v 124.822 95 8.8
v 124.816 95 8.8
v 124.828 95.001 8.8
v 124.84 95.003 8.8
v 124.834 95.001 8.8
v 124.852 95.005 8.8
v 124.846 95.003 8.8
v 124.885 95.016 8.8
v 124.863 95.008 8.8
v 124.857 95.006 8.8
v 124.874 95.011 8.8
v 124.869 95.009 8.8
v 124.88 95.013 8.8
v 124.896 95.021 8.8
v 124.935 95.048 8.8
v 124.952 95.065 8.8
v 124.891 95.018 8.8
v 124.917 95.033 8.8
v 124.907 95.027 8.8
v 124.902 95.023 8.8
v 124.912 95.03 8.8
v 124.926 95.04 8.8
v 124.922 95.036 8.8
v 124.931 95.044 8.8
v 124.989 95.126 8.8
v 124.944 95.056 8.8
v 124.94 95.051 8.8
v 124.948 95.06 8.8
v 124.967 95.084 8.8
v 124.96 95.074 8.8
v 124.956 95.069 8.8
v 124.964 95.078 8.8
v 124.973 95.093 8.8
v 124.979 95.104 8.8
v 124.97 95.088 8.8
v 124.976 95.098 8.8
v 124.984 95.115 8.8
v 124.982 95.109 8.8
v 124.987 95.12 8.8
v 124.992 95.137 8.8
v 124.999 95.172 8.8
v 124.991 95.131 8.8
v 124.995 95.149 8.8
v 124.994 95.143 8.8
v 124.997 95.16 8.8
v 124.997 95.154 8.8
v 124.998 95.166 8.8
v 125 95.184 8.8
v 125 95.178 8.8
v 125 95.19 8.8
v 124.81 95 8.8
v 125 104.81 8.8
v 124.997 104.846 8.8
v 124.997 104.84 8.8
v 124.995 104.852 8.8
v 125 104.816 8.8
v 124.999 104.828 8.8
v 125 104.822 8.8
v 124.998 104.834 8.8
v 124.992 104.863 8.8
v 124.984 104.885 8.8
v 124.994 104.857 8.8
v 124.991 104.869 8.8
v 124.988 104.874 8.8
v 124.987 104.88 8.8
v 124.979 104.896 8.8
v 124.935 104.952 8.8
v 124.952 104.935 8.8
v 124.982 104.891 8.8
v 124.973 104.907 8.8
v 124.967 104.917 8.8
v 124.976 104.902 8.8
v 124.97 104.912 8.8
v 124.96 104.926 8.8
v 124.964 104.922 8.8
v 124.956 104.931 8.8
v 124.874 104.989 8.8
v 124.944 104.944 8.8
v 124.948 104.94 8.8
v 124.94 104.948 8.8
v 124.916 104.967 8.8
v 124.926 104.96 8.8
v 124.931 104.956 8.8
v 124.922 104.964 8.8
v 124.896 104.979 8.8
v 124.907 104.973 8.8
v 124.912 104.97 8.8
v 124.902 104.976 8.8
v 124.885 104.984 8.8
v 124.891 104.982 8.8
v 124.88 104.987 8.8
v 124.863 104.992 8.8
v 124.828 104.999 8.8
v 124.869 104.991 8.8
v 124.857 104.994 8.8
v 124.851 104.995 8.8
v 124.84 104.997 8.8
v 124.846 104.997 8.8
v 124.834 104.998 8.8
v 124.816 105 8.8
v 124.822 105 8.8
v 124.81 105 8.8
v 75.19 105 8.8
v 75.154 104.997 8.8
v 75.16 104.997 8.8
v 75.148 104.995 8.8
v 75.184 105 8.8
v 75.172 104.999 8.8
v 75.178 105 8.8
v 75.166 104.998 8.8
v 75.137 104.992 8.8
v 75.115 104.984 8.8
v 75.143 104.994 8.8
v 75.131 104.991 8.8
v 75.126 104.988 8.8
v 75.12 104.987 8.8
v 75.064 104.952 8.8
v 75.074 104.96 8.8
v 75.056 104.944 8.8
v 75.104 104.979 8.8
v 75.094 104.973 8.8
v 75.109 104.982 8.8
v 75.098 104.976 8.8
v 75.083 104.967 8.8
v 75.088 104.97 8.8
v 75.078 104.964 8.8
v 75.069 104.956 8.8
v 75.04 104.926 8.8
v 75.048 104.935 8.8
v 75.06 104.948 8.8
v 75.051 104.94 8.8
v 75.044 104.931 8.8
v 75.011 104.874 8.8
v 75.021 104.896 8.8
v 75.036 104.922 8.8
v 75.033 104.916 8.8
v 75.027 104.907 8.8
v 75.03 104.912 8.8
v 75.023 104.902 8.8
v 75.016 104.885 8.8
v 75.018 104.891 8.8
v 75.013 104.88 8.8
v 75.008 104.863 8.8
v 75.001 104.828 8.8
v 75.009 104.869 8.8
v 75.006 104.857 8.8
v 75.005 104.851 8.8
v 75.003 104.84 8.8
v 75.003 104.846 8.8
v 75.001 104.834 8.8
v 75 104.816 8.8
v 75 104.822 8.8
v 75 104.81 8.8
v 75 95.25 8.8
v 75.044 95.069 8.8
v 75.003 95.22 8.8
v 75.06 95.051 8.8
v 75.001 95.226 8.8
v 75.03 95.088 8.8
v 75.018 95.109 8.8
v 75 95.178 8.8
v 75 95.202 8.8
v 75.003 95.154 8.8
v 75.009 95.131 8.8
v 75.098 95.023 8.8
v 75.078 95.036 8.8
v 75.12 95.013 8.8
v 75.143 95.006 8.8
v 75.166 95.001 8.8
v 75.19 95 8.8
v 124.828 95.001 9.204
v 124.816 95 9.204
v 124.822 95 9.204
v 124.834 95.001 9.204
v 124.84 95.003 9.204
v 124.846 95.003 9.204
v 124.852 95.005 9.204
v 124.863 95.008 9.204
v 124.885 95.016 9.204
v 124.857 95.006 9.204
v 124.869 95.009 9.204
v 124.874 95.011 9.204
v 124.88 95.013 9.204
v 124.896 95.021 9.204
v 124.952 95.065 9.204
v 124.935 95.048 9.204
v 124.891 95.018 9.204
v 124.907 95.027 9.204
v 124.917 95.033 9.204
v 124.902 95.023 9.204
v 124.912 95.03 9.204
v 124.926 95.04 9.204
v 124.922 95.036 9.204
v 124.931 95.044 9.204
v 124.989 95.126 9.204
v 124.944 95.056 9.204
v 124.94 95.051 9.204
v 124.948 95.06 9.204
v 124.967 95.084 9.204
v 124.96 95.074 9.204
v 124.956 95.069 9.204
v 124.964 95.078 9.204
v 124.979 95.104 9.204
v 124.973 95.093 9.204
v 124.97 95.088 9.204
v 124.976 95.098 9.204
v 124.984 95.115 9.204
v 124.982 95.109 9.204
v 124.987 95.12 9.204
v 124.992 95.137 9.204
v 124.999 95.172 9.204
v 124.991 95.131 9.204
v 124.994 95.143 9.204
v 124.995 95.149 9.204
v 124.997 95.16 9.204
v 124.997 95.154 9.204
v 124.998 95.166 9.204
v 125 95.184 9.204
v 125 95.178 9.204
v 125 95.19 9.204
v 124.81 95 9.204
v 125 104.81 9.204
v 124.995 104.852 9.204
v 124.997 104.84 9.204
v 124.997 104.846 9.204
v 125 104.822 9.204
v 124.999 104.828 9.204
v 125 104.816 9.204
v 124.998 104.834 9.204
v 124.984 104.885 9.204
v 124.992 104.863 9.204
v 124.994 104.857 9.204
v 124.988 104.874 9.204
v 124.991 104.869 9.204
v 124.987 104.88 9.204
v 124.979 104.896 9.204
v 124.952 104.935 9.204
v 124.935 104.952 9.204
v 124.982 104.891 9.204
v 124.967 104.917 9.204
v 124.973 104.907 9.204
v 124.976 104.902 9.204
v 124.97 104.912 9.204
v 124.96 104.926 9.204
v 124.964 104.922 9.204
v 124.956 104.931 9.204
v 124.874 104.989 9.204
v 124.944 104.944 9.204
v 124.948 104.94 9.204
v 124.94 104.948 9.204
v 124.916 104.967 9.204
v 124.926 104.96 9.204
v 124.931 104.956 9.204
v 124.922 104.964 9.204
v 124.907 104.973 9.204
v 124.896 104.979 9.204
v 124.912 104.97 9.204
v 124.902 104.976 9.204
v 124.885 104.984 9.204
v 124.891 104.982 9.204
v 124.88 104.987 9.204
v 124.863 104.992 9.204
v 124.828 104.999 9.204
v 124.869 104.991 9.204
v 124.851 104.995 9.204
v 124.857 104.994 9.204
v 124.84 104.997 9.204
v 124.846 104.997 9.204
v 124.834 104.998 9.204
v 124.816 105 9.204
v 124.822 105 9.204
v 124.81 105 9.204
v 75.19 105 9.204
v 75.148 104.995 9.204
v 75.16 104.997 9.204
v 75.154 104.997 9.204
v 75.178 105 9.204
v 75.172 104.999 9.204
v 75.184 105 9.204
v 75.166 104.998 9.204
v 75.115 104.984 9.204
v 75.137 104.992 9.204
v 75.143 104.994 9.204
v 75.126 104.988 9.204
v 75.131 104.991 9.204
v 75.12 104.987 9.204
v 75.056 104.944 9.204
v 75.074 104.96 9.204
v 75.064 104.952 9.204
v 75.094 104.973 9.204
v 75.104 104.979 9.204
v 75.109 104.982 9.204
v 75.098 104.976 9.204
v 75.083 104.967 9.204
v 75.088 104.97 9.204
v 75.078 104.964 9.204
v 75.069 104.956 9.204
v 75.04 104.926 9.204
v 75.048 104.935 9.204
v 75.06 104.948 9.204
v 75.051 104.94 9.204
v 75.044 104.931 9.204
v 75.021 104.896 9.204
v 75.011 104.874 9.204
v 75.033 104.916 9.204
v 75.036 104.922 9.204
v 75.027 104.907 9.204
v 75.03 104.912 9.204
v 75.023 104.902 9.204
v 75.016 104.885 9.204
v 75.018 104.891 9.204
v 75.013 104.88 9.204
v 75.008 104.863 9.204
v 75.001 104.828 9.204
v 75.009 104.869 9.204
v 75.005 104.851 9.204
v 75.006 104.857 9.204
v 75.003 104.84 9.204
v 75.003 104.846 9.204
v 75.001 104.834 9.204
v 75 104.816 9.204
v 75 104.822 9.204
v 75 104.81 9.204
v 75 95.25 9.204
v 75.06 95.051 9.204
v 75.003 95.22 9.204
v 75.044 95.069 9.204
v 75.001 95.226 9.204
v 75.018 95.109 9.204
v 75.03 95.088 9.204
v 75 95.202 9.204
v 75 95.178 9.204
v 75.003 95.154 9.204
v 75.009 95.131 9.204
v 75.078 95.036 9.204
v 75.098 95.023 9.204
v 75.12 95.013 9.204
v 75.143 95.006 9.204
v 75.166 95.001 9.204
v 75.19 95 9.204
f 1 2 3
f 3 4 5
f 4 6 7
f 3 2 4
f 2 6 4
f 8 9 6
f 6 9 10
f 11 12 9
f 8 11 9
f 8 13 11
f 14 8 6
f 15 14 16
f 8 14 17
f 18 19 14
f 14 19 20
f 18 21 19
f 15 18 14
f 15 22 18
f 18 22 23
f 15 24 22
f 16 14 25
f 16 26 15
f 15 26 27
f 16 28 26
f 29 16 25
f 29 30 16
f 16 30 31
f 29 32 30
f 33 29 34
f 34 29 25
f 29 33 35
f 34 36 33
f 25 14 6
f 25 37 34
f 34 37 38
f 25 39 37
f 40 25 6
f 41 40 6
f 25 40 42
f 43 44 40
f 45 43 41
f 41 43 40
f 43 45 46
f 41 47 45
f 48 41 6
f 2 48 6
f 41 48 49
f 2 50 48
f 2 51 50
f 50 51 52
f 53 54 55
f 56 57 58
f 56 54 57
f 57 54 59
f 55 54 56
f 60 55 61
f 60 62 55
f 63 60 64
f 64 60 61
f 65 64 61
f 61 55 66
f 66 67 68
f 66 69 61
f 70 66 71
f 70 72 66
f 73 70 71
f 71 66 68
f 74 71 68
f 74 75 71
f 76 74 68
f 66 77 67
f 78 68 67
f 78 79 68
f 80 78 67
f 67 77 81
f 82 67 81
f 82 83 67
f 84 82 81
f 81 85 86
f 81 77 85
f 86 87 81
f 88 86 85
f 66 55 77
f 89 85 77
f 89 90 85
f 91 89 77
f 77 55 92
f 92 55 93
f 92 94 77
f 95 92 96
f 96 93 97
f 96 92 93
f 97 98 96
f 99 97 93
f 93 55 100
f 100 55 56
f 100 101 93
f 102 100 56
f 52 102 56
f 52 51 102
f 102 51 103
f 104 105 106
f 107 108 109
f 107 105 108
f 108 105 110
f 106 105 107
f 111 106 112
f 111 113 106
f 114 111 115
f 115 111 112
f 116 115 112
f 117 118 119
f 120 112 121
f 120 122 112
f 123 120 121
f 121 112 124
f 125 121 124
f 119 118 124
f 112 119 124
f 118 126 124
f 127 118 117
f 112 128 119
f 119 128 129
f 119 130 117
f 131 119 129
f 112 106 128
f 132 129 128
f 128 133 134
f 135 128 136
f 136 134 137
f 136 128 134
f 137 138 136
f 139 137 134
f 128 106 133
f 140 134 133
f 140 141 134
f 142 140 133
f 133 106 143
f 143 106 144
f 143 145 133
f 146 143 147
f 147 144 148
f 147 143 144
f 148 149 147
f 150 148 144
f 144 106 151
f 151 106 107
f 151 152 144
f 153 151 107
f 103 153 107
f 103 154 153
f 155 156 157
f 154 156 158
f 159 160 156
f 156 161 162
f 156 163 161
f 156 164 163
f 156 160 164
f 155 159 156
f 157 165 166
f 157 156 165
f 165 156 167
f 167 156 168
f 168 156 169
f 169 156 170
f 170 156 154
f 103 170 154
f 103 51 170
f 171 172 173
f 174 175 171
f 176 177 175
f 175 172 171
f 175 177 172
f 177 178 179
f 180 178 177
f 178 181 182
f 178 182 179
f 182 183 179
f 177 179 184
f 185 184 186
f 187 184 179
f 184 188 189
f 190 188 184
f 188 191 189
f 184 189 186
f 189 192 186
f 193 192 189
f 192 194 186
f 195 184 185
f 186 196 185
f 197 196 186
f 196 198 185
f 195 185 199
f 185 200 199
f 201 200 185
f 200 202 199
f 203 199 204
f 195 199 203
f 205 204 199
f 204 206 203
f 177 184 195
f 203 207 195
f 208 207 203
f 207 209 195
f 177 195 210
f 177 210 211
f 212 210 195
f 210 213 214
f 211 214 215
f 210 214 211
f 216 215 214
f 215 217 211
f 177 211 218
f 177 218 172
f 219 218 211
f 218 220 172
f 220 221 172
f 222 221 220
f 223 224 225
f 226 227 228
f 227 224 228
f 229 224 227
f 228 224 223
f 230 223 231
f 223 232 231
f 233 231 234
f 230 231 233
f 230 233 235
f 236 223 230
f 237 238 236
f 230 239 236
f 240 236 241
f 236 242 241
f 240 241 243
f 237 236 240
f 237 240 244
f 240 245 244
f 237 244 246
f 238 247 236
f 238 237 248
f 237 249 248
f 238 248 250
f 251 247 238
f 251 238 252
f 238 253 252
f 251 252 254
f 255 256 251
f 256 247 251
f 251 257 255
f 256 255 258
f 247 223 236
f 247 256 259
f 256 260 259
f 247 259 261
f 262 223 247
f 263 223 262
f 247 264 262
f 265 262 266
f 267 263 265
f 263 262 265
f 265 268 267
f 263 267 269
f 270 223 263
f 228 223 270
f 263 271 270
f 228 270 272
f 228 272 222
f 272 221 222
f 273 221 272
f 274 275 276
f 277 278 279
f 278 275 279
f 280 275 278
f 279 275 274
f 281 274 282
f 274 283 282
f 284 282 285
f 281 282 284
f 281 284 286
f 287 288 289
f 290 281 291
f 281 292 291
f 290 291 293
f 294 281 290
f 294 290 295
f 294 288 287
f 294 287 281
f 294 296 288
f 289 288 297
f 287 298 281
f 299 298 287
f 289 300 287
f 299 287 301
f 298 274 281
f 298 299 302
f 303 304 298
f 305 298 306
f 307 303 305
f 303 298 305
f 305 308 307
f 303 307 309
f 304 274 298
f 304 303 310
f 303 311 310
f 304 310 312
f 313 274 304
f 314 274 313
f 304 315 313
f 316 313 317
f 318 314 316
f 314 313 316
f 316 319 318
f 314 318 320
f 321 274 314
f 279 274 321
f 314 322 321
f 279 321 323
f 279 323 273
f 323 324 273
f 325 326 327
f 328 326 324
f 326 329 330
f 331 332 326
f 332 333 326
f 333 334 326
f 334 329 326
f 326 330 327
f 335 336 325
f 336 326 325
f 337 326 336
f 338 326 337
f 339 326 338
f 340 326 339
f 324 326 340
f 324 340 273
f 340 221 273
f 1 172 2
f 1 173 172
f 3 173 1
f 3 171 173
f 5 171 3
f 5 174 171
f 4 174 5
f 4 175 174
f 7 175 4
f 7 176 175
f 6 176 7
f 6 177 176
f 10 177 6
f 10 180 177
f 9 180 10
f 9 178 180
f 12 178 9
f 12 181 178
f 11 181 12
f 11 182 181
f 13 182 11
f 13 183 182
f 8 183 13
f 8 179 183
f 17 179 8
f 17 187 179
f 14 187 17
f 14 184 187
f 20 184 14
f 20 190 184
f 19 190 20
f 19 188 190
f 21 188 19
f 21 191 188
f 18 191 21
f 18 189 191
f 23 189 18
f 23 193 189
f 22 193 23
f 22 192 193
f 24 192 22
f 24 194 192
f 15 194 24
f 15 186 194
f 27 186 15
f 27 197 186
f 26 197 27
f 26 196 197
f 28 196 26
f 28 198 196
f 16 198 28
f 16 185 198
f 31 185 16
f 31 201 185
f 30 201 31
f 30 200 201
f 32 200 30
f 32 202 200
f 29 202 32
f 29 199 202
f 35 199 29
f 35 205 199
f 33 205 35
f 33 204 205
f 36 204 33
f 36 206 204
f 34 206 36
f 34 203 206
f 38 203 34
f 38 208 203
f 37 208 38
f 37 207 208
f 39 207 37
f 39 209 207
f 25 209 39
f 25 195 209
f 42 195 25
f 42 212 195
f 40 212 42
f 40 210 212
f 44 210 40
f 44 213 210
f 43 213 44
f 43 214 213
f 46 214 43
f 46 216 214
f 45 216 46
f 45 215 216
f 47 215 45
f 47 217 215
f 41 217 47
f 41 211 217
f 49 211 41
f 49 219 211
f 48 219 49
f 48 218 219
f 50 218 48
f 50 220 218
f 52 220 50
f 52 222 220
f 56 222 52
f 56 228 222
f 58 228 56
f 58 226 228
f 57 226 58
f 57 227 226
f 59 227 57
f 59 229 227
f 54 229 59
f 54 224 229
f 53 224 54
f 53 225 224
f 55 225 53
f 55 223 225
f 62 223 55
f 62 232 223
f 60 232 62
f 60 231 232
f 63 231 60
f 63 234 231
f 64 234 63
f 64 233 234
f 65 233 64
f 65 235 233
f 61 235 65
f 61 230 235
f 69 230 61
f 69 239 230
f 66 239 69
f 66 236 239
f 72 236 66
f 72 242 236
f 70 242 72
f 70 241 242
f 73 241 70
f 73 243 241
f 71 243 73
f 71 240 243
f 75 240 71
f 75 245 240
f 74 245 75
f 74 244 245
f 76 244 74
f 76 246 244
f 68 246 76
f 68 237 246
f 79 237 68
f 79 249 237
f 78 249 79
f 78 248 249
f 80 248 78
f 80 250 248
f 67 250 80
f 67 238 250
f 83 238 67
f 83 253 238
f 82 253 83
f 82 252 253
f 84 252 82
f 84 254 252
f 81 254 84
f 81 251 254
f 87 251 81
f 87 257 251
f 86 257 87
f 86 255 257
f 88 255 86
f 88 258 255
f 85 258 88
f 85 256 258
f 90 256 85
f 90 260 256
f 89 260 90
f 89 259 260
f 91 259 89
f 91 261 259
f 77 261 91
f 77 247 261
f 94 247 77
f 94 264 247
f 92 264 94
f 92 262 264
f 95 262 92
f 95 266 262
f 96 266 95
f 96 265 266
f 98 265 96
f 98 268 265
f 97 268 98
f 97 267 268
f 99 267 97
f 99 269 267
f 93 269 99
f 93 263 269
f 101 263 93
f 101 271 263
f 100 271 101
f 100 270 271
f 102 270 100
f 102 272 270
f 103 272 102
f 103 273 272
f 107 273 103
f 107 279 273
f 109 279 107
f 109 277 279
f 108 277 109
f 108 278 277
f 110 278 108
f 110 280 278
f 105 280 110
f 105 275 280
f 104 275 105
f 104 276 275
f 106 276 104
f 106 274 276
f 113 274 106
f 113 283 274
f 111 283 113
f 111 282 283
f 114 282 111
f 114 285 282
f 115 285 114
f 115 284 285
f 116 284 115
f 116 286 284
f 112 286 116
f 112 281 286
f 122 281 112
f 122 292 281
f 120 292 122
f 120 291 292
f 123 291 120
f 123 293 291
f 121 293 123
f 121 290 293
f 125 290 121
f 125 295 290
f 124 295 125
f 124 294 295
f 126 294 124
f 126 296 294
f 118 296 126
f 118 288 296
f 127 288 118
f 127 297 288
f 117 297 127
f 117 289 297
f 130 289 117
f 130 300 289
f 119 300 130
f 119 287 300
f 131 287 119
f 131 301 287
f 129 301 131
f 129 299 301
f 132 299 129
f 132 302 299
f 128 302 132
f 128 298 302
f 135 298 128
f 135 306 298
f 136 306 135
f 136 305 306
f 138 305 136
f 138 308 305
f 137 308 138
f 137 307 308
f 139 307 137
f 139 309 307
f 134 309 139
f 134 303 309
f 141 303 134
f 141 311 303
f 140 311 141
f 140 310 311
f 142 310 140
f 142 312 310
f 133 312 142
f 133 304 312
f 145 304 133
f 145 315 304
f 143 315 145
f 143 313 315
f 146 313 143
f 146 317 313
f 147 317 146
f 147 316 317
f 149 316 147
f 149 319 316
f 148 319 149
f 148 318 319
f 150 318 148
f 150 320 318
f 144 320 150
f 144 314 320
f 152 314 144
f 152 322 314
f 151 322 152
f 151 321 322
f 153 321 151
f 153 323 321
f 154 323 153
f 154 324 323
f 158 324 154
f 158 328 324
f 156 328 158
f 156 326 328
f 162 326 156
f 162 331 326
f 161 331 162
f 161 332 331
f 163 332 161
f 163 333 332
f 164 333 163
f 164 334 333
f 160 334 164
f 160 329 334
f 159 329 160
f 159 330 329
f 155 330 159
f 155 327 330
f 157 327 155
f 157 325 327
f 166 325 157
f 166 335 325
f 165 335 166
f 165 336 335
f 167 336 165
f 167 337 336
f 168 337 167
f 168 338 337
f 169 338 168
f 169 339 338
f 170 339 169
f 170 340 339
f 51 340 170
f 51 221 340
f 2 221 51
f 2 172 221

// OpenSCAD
module drawBasicShape(x1, y1, x2, y2, width)
{
	length = sqrt((x1-x2)*(x1-x2) + (y1-y2)*(y1-y2));
	if (width!=0.0) {
		square(size = [width, length], center = false);
		translate([width/2.0, 0, 0]) circle(d=width);
		translate([width/2.0, length, 0]) circle(d=width);
	}
}

module translateAndRotate(x1, y1, x2, y2, width)
{
	if (width != 0.0) {
		angle = atan((y2-y1)/(x2-x1)) +270;
		if (x2>=x1) {
			translate([x1, y1, 0.0]) rotate([0.0, 0.0, angle]) translate([-width/2.0, 0.0, 0.0]) scale([1.0, 1.0, 1.0]) drawBasicShape(x1, y1, x2, y2, width);
		}
		else {
			translate([x1, y1, 0.0]) rotate([0.0, 0.0, angle+180]) translate([-width/2.0, 0.0, 0.0]) scale([1.0, 1.0, 1.0]) drawBasicShape(x1, y1, x2, y2, width);		}
	}
}

$fn=50;

points21 = [
[75.77800000, 95.77800000, 0.00000000],
[124.22200000, 95.77800000, 0.37999672],
[124.22200000, 104.22200000, 0.37997788],
[75.77800000, 104.22200000, 0.37999548],
[75.77800000, 95.83800000, 0.37998140],
[75.48400000, 95.48400000, 0.00000000],
[124.51600000, 95.48400000, 0.37999746],
[124.51600000, 104.51600000, 0.37998977],
[75.48400000, 104.51600000, 0.37999868],
[75.48400000, 95.54400000, 0.37998644],
[75.19000000, 95.19000000, 0.00000000],
[124.81000000, 95.19000000, 0.38000060],
[124.81000000, 104.81000000, 0.38000021],
[75.19000000, 104.81000000, 0.37999939],
[75.19000000, 95.25000000, 0.38000344],
[75.53600000, 95.39000000, 0.00000000],
[76.11100000, 95.94600000, 0.00000000],
[75.94600000, 96.11100000, 0.37961375],
[75.94600000, 96.52800000, 0.38001190],
[76.52800000, 95.94600000, 0.37989934],
[76.94500000, 95.94600000, 0.38001190],
[75.94600000, 96.94500000, 0.37998907],
[75.94600000, 97.36200000, 0.38001190],
[77.36200000, 95.94600000, 0.37999592],
[77.77900000, 95.94600000, 0.38001190],
[75.94600000, 97.77900000, 0.37999966],
[75.94600000, 98.19600000, 0.38001190],
[78.19600000, 95.94600000, 0.38002091],
[78.61300000, 95.94600000, 0.38001190],
[75.94600000, 98.61300000, 0.38000362],
[75.94600000, 99.03000000, 0.38015610],
[79.03000000, 95.94600000, 0.38001859],
[79.44700000, 95.94600000, 0.38001190],
[75.94600000, 99.44700000, 0.38001785],
[75.94600000, 99.86400000, 0.38015610],
[79.86400000, 95.94600000, 0.38001726],
[80.28100000, 95.94600000, 0.38015610],
[75.94600000, 100.28100000, 0.38002660],
[75.94600000, 100.69800000, 0.38001190],
[80.69800000, 95.94600000, 0.38002534],
[81.11500000, 95.94600000, 0.38001190],
[75.94600000, 101.11500000, 0.38003252],
[75.94600000, 101.53300000, 0.37930814],
[81.53300000, 95.94600000, 0.37997836],
[81.95000000, 95.94600000, 0.38015610],
[75.94600000, 101.95000000, 0.37998072],
[75.94600000, 102.36700000, 0.38001190],
[82.36700000, 95.94600000, 0.37998939],
[82.78400000, 95.94600000, 0.38001190],
[75.94600000, 102.78400000, 0.37999079],
[75.94600000, 103.20100000, 0.38001190],
[83.20100000, 95.94600000, 0.37999789],
[83.61800000, 95.94600000, 0.38001190],
[75.94600000, 103.61800000, 0.37999868],
[75.95600000, 104.02400000, 0.38033920],
[84.03500000, 95.94600000, 0.38000275],
[84.45200000, 95.94600000, 0.38001190],
[76.34400000, 104.05400000, 0.38000754],
[76.76100000, 104.05400000, 0.38001190],
[84.86900000, 95.94600000, 0.38000229],
[85.28600000, 95.94600000, 0.38015610],
[77.17800000, 104.05400000, 0.38000229],
[77.59500000, 104.05400000, 0.38001190],
[85.70300000, 95.94600000, 0.38000754],
[86.12000000, 95.94600000, 0.38001190],
[78.01200000, 104.05400000, 0.38000229],
[78.42900000, 104.05400000, 0.38001190],
[86.53700000, 95.94600000, 0.38000754],
[86.95400000, 95.94600000, 0.38001190],
[78.84600000, 104.05400000, 0.38000229],
[79.26300000, 104.05400000, 0.38015610],
[87.37100000, 95.94600000, 0.38000229],
[87.78900000, 95.94600000, 0.37930814],
[79.68000000, 104.05400000, 0.37998940],
[80.09700000, 104.05400000, 0.38001190],
[88.20600000, 95.94600000, 0.37998415],
[88.62300000, 95.94600000, 0.38001190],
[80.51500000, 104.05400000, 0.38000754],
[80.93200000, 104.05400000, 0.38001190],
[89.04000000, 95.94600000, 0.38000229],
[89.45700000, 95.94600000, 0.38015610],
[81.34900000, 104.05400000, 0.38000229],
[81.76600000, 104.05400000, 0.38001190],
[89.87400000, 95.94600000, 0.38000754],
[90.29100000, 95.94600000, 0.38001190],
[82.18300000, 104.05400000, 0.38000229],
[82.60000000, 104.05400000, 0.38001190],
[90.70800000, 95.94600000, 0.38000754],
[91.12500000, 95.94600000, 0.38001190],
[83.01700000, 104.05400000, 0.38000229],
[83.43400000, 104.05400000, 0.38015610],
[91.54200000, 95.94600000, 0.38000229],
[91.95900000, 95.94600000, 0.38001190],
[83.85100000, 104.05400000, 0.38000229],
[84.26800000, 104.05400000, 0.38015610],
[92.37600000, 95.94600000, 0.38000229],
[92.79300000, 95.94600000, 0.38001190],
[84.68500000, 104.05400000, 0.38000754],
[85.10200000, 104.05400000, 0.38001190],
[93.21000000, 95.94600000, 0.38000229],
[93.62700000, 95.94600000, 0.38015610],
[85.51900000, 104.05400000, 0.38000229],
[85.93600000, 104.05400000, 0.38001190],
[94.04400000, 95.94600000, 0.38000229],
[94.46200000, 95.94600000, 0.37945200],
[86.35300000, 104.05400000, 0.37998415],
[86.77000000, 104.05400000, 0.38001190],
[94.87900000, 95.94600000, 0.37998940],
[95.29600000, 95.94600000, 0.38001190],
[87.18800000, 104.05400000, 0.38000229],
[87.60500000, 104.05400000, 0.38001190],
[95.71300000, 95.94600000, 0.38000754],
[96.13000000, 95.94600000, 0.38001190],
[88.02200000, 104.05400000, 0.38000229],
[88.43900000, 104.05400000, 0.38015610],
[96.54700000, 95.94600000, 0.38000229],
[96.96400000, 95.94600000, 0.38001190],
[88.85600000, 104.05400000, 0.38000754],
[89.27300000, 104.05400000, 0.38001190],
[97.38100000, 95.94600000, 0.38000229],
[97.79800000, 95.94600000, 0.38001190],
[89.69000000, 104.05400000, 0.38000754],
[90.10700000, 104.05400000, 0.38001190],
[98.21500000, 95.94600000, 0.38000229],
[98.63200000, 95.94600000, 0.38015610],
[90.52400000, 104.05400000, 0.38000229],
[90.94100000, 104.05400000, 0.38001190],
[99.04900000, 95.94600000, 0.38000754],
[99.46600000, 95.94600000, 0.38001190],
[91.35800000, 104.05400000, 0.38000229],
[91.77500000, 104.05400000, 0.38001190],
[99.88300000, 95.94600000, 0.38000754],
[100.30000000, 95.94600000, 0.38001190],
[92.19200000, 104.05400000, 0.38000229],
[92.60900000, 104.05400000, 0.38015610],
[100.71800000, 95.94600000, 0.37998415],
[101.13500000, 95.94600000, 0.38001190],
[93.02600000, 104.05400000, 0.37998940],
[93.44400000, 104.05400000, 0.37930814],
[101.55200000, 95.94600000, 0.38000229],
[101.96900000, 95.94600000, 0.38001190],
[93.86100000, 104.05400000, 0.38000754],
[94.27800000, 104.05400000, 0.38001190],
[102.38600000, 95.94600000, 0.38000229],
[102.80300000, 95.94600000, 0.38015610],
[94.69500000, 104.05400000, 0.38000229],
[95.11200000, 104.05400000, 0.38001190],
[103.22000000, 95.94600000, 0.38000754],
[103.63700000, 95.94600000, 0.38001190],
[95.52900000, 104.05400000, 0.38000229],
[95.94600000, 104.05400000, 0.38001190],
[104.05400000, 95.94600000, 0.38000754],
[104.47100000, 95.94600000, 0.38001190],
[96.36300000, 104.05400000, 0.38000229],
[96.78000000, 104.05400000, 0.38015610],
[104.88800000, 95.94600000, 0.38000229],
[105.30500000, 95.94600000, 0.38001190],
[97.19700000, 104.05400000, 0.38000754],
[97.61400000, 104.05400000, 0.38001190],
[105.72200000, 95.94600000, 0.38000229],
[106.13900000, 95.94600000, 0.38001190],
[98.03100000, 104.05400000, 0.38000754],
[98.44800000, 104.05400000, 0.38001190],
[106.55600000, 95.94600000, 0.38000229],
[106.97300000, 95.94600000, 0.38015610],
[98.86500000, 104.05400000, 0.38000229],
[99.28200000, 104.05400000, 0.38001190],
[107.39100000, 95.94600000, 0.37998940],
[107.80800000, 95.94600000, 0.38001190],
[99.69900000, 104.05400000, 0.37998415],
[100.11700000, 104.05400000, 0.37945200],
[108.22500000, 95.94600000, 0.38000229],
[108.64200000, 95.94600000, 0.38001190],
[100.53400000, 104.05400000, 0.38000229],
[100.95100000, 104.05400000, 0.38015610],
[109.05900000, 95.94600000, 0.38000229],
[109.47600000, 95.94600000, 0.38001190],
[101.36800000, 104.05400000, 0.38000754],
[101.78500000, 104.05400000, 0.38001190],
[109.89300000, 95.94600000, 0.38000229],
[110.31000000, 95.94600000, 0.38001190],
[102.20200000, 104.05400000, 0.38000754],
[102.61900000, 104.05400000, 0.38001190],
[110.72700000, 95.94600000, 0.38000229],
[111.14400000, 95.94600000, 0.38015610],
[103.03600000, 104.05400000, 0.38000229],
[103.45300000, 104.05400000, 0.38001190],
[111.56100000, 95.94600000, 0.38000754],
[111.97800000, 95.94600000, 0.38001190],
[103.87000000, 104.05400000, 0.38000229],
[104.28700000, 104.05400000, 0.38001190],
[112.39500000, 95.94600000, 0.38000754],
[112.81200000, 95.94600000, 0.38001190],
[104.70400000, 104.05400000, 0.38000229],
[105.12100000, 104.05400000, 0.38015610],
[113.22900000, 95.94600000, 0.38000229],
[113.64700000, 95.94600000, 0.37930814],
[105.53800000, 104.05400000, 0.37998940],
[105.95500000, 104.05400000, 0.38001190],
[114.06400000, 95.94600000, 0.37998415],
[114.48100000, 95.94600000, 0.38001190],
[106.37300000, 104.05400000, 0.38000754],
[106.79000000, 104.05400000, 0.38001190],
[114.89800000, 95.94600000, 0.38000229],
[115.31500000, 95.94600000, 0.38015610],
[107.20700000, 104.05400000, 0.38000229],
[107.62400000, 104.05400000, 0.38001190],
[115.73200000, 95.94600000, 0.38000754],
[116.14900000, 95.94600000, 0.38001190],
[108.04100000, 104.05400000, 0.38000229],
[108.45800000, 104.05400000, 0.38001190],
[116.56600000, 95.94600000, 0.38000754],
[116.98300000, 95.94600000, 0.38001190],
[108.87500000, 104.05400000, 0.38000229],
[109.29200000, 104.05400000, 0.38015610],
[117.40000000, 95.94600000, 0.38000229],
[117.81700000, 95.94600000, 0.38001190],
[109.70900000, 104.05400000, 0.38000754],
[110.12600000, 104.05400000, 0.38001190],
[118.23400000, 95.94600000, 0.38000229],
[118.65100000, 95.94600000, 0.38001190],
[110.54300000, 104.05400000, 0.38000754],
[110.96000000, 104.05400000, 0.38001190],
[119.06800000, 95.94600000, 0.38000229],
[119.48500000, 95.94600000, 0.38015610],
[111.37700000, 104.05400000, 0.38000229],
[111.79400000, 104.05400000, 0.38001190],
[119.90200000, 95.94600000, 0.38000754],
[120.32000000, 95.94600000, 0.37930814],
[112.21100000, 104.05400000, 0.37998415],
[112.62900000, 104.05400000, 0.37930814],
[120.73700000, 95.94600000, 0.38000754],
[121.15400000, 95.94600000, 0.38001190],
[113.04600000, 104.05400000, 0.38000229],
[113.46300000, 104.05400000, 0.38015610],
[121.57100000, 95.94600000, 0.38000229],
[121.98800000, 95.94600000, 0.38001190],
[113.88000000, 104.05400000, 0.38000754],
[114.29700000, 104.05400000, 0.38001190],
[122.40500000, 95.94600000, 0.38000229],
[122.82200000, 95.94600000, 0.38001190],
[114.71400000, 104.05400000, 0.38000754],
[115.13100000, 104.05400000, 0.38001190],
[123.23900000, 95.94600000, 0.38000229],
[123.65600000, 95.94600000, 0.38015610],
[115.54800000, 104.05400000, 0.38000229],
[115.96500000, 104.05400000, 0.38001190],
[124.04400000, 95.97500000, 0.37998455],
[124.05400000, 96.38200000, 0.37976376],
[116.38200000, 104.05400000, 0.37999868],
[116.79900000, 104.05400000, 0.38001190],
[124.05400000, 96.79900000, 0.37999789],
[124.05400000, 97.21600000, 0.38001190],
[117.21600000, 104.05400000, 0.37999079],
[117.63300000, 104.05400000, 0.38015610],
[124.05400000, 97.63300000, 0.37998939],
[124.05400000, 98.05000000, 0.38001190],
[118.05000000, 104.05400000, 0.37998780],
[118.46700000, 104.05400000, 0.38001190],
[124.05400000, 98.46700000, 0.37997836],
[124.05400000, 98.88400000, 0.38001190],
[118.88400000, 104.05400000, 0.37998384],
[119.30200000, 104.05400000, 0.37930814],
[124.05400000, 99.30200000, 0.38002534],
[124.05400000, 99.71900000, 0.38015610],
[119.71900000, 104.05400000, 0.38002660],
[120.13600000, 104.05400000, 0.38001190],
[124.05400000, 100.13600000, 0.38002811],
[124.05400000, 100.55300000, 0.38015610],
[120.55300000, 104.05400000, 0.38001785],
[120.97000000, 104.05400000, 0.38015610],
[124.05400000, 100.97000000, 0.38001859],
[124.05400000, 101.38700000, 0.38001190],
[121.38700000, 104.05400000, 0.38001957],
[121.80400000, 104.05400000, 0.38015610],
[124.05400000, 101.80400000, 0.38000201],
[124.05400000, 102.22100000, 0.38015610],
[122.22100000, 104.05400000, 0.37999966],
[122.63800000, 104.05400000, 0.38001190],
[124.05400000, 102.63800000, 0.37999592],
[124.05400000, 103.05500000, 0.38015610],
[123.05500000, 104.05400000, 0.37994651],
[123.47200000, 104.05400000, 0.38015610],
[124.05400000, 103.47200000, 0.37989934],
[124.05400000, 103.88900000, 0.38001190],
[123.88900000, 104.05400000, 0.37961375],
];

translate([0.0, 0.0, 8.80000000]) {
	linear_extrude(height = 0.40400000, center = false, convexity = 10, twist = 0) {
		union() {
			for( i=[0:len(points21)-2] ){ 
				x1 = points21[i][0];
				y1 = points21[i][1];
				x2 = points21[i+1][0];
				y2 = points21[i+1][1];
				width = points21[i+1][2];
				translateAndRotate(x1, y1, x2, y2, width);
			}
		}
	}
}
